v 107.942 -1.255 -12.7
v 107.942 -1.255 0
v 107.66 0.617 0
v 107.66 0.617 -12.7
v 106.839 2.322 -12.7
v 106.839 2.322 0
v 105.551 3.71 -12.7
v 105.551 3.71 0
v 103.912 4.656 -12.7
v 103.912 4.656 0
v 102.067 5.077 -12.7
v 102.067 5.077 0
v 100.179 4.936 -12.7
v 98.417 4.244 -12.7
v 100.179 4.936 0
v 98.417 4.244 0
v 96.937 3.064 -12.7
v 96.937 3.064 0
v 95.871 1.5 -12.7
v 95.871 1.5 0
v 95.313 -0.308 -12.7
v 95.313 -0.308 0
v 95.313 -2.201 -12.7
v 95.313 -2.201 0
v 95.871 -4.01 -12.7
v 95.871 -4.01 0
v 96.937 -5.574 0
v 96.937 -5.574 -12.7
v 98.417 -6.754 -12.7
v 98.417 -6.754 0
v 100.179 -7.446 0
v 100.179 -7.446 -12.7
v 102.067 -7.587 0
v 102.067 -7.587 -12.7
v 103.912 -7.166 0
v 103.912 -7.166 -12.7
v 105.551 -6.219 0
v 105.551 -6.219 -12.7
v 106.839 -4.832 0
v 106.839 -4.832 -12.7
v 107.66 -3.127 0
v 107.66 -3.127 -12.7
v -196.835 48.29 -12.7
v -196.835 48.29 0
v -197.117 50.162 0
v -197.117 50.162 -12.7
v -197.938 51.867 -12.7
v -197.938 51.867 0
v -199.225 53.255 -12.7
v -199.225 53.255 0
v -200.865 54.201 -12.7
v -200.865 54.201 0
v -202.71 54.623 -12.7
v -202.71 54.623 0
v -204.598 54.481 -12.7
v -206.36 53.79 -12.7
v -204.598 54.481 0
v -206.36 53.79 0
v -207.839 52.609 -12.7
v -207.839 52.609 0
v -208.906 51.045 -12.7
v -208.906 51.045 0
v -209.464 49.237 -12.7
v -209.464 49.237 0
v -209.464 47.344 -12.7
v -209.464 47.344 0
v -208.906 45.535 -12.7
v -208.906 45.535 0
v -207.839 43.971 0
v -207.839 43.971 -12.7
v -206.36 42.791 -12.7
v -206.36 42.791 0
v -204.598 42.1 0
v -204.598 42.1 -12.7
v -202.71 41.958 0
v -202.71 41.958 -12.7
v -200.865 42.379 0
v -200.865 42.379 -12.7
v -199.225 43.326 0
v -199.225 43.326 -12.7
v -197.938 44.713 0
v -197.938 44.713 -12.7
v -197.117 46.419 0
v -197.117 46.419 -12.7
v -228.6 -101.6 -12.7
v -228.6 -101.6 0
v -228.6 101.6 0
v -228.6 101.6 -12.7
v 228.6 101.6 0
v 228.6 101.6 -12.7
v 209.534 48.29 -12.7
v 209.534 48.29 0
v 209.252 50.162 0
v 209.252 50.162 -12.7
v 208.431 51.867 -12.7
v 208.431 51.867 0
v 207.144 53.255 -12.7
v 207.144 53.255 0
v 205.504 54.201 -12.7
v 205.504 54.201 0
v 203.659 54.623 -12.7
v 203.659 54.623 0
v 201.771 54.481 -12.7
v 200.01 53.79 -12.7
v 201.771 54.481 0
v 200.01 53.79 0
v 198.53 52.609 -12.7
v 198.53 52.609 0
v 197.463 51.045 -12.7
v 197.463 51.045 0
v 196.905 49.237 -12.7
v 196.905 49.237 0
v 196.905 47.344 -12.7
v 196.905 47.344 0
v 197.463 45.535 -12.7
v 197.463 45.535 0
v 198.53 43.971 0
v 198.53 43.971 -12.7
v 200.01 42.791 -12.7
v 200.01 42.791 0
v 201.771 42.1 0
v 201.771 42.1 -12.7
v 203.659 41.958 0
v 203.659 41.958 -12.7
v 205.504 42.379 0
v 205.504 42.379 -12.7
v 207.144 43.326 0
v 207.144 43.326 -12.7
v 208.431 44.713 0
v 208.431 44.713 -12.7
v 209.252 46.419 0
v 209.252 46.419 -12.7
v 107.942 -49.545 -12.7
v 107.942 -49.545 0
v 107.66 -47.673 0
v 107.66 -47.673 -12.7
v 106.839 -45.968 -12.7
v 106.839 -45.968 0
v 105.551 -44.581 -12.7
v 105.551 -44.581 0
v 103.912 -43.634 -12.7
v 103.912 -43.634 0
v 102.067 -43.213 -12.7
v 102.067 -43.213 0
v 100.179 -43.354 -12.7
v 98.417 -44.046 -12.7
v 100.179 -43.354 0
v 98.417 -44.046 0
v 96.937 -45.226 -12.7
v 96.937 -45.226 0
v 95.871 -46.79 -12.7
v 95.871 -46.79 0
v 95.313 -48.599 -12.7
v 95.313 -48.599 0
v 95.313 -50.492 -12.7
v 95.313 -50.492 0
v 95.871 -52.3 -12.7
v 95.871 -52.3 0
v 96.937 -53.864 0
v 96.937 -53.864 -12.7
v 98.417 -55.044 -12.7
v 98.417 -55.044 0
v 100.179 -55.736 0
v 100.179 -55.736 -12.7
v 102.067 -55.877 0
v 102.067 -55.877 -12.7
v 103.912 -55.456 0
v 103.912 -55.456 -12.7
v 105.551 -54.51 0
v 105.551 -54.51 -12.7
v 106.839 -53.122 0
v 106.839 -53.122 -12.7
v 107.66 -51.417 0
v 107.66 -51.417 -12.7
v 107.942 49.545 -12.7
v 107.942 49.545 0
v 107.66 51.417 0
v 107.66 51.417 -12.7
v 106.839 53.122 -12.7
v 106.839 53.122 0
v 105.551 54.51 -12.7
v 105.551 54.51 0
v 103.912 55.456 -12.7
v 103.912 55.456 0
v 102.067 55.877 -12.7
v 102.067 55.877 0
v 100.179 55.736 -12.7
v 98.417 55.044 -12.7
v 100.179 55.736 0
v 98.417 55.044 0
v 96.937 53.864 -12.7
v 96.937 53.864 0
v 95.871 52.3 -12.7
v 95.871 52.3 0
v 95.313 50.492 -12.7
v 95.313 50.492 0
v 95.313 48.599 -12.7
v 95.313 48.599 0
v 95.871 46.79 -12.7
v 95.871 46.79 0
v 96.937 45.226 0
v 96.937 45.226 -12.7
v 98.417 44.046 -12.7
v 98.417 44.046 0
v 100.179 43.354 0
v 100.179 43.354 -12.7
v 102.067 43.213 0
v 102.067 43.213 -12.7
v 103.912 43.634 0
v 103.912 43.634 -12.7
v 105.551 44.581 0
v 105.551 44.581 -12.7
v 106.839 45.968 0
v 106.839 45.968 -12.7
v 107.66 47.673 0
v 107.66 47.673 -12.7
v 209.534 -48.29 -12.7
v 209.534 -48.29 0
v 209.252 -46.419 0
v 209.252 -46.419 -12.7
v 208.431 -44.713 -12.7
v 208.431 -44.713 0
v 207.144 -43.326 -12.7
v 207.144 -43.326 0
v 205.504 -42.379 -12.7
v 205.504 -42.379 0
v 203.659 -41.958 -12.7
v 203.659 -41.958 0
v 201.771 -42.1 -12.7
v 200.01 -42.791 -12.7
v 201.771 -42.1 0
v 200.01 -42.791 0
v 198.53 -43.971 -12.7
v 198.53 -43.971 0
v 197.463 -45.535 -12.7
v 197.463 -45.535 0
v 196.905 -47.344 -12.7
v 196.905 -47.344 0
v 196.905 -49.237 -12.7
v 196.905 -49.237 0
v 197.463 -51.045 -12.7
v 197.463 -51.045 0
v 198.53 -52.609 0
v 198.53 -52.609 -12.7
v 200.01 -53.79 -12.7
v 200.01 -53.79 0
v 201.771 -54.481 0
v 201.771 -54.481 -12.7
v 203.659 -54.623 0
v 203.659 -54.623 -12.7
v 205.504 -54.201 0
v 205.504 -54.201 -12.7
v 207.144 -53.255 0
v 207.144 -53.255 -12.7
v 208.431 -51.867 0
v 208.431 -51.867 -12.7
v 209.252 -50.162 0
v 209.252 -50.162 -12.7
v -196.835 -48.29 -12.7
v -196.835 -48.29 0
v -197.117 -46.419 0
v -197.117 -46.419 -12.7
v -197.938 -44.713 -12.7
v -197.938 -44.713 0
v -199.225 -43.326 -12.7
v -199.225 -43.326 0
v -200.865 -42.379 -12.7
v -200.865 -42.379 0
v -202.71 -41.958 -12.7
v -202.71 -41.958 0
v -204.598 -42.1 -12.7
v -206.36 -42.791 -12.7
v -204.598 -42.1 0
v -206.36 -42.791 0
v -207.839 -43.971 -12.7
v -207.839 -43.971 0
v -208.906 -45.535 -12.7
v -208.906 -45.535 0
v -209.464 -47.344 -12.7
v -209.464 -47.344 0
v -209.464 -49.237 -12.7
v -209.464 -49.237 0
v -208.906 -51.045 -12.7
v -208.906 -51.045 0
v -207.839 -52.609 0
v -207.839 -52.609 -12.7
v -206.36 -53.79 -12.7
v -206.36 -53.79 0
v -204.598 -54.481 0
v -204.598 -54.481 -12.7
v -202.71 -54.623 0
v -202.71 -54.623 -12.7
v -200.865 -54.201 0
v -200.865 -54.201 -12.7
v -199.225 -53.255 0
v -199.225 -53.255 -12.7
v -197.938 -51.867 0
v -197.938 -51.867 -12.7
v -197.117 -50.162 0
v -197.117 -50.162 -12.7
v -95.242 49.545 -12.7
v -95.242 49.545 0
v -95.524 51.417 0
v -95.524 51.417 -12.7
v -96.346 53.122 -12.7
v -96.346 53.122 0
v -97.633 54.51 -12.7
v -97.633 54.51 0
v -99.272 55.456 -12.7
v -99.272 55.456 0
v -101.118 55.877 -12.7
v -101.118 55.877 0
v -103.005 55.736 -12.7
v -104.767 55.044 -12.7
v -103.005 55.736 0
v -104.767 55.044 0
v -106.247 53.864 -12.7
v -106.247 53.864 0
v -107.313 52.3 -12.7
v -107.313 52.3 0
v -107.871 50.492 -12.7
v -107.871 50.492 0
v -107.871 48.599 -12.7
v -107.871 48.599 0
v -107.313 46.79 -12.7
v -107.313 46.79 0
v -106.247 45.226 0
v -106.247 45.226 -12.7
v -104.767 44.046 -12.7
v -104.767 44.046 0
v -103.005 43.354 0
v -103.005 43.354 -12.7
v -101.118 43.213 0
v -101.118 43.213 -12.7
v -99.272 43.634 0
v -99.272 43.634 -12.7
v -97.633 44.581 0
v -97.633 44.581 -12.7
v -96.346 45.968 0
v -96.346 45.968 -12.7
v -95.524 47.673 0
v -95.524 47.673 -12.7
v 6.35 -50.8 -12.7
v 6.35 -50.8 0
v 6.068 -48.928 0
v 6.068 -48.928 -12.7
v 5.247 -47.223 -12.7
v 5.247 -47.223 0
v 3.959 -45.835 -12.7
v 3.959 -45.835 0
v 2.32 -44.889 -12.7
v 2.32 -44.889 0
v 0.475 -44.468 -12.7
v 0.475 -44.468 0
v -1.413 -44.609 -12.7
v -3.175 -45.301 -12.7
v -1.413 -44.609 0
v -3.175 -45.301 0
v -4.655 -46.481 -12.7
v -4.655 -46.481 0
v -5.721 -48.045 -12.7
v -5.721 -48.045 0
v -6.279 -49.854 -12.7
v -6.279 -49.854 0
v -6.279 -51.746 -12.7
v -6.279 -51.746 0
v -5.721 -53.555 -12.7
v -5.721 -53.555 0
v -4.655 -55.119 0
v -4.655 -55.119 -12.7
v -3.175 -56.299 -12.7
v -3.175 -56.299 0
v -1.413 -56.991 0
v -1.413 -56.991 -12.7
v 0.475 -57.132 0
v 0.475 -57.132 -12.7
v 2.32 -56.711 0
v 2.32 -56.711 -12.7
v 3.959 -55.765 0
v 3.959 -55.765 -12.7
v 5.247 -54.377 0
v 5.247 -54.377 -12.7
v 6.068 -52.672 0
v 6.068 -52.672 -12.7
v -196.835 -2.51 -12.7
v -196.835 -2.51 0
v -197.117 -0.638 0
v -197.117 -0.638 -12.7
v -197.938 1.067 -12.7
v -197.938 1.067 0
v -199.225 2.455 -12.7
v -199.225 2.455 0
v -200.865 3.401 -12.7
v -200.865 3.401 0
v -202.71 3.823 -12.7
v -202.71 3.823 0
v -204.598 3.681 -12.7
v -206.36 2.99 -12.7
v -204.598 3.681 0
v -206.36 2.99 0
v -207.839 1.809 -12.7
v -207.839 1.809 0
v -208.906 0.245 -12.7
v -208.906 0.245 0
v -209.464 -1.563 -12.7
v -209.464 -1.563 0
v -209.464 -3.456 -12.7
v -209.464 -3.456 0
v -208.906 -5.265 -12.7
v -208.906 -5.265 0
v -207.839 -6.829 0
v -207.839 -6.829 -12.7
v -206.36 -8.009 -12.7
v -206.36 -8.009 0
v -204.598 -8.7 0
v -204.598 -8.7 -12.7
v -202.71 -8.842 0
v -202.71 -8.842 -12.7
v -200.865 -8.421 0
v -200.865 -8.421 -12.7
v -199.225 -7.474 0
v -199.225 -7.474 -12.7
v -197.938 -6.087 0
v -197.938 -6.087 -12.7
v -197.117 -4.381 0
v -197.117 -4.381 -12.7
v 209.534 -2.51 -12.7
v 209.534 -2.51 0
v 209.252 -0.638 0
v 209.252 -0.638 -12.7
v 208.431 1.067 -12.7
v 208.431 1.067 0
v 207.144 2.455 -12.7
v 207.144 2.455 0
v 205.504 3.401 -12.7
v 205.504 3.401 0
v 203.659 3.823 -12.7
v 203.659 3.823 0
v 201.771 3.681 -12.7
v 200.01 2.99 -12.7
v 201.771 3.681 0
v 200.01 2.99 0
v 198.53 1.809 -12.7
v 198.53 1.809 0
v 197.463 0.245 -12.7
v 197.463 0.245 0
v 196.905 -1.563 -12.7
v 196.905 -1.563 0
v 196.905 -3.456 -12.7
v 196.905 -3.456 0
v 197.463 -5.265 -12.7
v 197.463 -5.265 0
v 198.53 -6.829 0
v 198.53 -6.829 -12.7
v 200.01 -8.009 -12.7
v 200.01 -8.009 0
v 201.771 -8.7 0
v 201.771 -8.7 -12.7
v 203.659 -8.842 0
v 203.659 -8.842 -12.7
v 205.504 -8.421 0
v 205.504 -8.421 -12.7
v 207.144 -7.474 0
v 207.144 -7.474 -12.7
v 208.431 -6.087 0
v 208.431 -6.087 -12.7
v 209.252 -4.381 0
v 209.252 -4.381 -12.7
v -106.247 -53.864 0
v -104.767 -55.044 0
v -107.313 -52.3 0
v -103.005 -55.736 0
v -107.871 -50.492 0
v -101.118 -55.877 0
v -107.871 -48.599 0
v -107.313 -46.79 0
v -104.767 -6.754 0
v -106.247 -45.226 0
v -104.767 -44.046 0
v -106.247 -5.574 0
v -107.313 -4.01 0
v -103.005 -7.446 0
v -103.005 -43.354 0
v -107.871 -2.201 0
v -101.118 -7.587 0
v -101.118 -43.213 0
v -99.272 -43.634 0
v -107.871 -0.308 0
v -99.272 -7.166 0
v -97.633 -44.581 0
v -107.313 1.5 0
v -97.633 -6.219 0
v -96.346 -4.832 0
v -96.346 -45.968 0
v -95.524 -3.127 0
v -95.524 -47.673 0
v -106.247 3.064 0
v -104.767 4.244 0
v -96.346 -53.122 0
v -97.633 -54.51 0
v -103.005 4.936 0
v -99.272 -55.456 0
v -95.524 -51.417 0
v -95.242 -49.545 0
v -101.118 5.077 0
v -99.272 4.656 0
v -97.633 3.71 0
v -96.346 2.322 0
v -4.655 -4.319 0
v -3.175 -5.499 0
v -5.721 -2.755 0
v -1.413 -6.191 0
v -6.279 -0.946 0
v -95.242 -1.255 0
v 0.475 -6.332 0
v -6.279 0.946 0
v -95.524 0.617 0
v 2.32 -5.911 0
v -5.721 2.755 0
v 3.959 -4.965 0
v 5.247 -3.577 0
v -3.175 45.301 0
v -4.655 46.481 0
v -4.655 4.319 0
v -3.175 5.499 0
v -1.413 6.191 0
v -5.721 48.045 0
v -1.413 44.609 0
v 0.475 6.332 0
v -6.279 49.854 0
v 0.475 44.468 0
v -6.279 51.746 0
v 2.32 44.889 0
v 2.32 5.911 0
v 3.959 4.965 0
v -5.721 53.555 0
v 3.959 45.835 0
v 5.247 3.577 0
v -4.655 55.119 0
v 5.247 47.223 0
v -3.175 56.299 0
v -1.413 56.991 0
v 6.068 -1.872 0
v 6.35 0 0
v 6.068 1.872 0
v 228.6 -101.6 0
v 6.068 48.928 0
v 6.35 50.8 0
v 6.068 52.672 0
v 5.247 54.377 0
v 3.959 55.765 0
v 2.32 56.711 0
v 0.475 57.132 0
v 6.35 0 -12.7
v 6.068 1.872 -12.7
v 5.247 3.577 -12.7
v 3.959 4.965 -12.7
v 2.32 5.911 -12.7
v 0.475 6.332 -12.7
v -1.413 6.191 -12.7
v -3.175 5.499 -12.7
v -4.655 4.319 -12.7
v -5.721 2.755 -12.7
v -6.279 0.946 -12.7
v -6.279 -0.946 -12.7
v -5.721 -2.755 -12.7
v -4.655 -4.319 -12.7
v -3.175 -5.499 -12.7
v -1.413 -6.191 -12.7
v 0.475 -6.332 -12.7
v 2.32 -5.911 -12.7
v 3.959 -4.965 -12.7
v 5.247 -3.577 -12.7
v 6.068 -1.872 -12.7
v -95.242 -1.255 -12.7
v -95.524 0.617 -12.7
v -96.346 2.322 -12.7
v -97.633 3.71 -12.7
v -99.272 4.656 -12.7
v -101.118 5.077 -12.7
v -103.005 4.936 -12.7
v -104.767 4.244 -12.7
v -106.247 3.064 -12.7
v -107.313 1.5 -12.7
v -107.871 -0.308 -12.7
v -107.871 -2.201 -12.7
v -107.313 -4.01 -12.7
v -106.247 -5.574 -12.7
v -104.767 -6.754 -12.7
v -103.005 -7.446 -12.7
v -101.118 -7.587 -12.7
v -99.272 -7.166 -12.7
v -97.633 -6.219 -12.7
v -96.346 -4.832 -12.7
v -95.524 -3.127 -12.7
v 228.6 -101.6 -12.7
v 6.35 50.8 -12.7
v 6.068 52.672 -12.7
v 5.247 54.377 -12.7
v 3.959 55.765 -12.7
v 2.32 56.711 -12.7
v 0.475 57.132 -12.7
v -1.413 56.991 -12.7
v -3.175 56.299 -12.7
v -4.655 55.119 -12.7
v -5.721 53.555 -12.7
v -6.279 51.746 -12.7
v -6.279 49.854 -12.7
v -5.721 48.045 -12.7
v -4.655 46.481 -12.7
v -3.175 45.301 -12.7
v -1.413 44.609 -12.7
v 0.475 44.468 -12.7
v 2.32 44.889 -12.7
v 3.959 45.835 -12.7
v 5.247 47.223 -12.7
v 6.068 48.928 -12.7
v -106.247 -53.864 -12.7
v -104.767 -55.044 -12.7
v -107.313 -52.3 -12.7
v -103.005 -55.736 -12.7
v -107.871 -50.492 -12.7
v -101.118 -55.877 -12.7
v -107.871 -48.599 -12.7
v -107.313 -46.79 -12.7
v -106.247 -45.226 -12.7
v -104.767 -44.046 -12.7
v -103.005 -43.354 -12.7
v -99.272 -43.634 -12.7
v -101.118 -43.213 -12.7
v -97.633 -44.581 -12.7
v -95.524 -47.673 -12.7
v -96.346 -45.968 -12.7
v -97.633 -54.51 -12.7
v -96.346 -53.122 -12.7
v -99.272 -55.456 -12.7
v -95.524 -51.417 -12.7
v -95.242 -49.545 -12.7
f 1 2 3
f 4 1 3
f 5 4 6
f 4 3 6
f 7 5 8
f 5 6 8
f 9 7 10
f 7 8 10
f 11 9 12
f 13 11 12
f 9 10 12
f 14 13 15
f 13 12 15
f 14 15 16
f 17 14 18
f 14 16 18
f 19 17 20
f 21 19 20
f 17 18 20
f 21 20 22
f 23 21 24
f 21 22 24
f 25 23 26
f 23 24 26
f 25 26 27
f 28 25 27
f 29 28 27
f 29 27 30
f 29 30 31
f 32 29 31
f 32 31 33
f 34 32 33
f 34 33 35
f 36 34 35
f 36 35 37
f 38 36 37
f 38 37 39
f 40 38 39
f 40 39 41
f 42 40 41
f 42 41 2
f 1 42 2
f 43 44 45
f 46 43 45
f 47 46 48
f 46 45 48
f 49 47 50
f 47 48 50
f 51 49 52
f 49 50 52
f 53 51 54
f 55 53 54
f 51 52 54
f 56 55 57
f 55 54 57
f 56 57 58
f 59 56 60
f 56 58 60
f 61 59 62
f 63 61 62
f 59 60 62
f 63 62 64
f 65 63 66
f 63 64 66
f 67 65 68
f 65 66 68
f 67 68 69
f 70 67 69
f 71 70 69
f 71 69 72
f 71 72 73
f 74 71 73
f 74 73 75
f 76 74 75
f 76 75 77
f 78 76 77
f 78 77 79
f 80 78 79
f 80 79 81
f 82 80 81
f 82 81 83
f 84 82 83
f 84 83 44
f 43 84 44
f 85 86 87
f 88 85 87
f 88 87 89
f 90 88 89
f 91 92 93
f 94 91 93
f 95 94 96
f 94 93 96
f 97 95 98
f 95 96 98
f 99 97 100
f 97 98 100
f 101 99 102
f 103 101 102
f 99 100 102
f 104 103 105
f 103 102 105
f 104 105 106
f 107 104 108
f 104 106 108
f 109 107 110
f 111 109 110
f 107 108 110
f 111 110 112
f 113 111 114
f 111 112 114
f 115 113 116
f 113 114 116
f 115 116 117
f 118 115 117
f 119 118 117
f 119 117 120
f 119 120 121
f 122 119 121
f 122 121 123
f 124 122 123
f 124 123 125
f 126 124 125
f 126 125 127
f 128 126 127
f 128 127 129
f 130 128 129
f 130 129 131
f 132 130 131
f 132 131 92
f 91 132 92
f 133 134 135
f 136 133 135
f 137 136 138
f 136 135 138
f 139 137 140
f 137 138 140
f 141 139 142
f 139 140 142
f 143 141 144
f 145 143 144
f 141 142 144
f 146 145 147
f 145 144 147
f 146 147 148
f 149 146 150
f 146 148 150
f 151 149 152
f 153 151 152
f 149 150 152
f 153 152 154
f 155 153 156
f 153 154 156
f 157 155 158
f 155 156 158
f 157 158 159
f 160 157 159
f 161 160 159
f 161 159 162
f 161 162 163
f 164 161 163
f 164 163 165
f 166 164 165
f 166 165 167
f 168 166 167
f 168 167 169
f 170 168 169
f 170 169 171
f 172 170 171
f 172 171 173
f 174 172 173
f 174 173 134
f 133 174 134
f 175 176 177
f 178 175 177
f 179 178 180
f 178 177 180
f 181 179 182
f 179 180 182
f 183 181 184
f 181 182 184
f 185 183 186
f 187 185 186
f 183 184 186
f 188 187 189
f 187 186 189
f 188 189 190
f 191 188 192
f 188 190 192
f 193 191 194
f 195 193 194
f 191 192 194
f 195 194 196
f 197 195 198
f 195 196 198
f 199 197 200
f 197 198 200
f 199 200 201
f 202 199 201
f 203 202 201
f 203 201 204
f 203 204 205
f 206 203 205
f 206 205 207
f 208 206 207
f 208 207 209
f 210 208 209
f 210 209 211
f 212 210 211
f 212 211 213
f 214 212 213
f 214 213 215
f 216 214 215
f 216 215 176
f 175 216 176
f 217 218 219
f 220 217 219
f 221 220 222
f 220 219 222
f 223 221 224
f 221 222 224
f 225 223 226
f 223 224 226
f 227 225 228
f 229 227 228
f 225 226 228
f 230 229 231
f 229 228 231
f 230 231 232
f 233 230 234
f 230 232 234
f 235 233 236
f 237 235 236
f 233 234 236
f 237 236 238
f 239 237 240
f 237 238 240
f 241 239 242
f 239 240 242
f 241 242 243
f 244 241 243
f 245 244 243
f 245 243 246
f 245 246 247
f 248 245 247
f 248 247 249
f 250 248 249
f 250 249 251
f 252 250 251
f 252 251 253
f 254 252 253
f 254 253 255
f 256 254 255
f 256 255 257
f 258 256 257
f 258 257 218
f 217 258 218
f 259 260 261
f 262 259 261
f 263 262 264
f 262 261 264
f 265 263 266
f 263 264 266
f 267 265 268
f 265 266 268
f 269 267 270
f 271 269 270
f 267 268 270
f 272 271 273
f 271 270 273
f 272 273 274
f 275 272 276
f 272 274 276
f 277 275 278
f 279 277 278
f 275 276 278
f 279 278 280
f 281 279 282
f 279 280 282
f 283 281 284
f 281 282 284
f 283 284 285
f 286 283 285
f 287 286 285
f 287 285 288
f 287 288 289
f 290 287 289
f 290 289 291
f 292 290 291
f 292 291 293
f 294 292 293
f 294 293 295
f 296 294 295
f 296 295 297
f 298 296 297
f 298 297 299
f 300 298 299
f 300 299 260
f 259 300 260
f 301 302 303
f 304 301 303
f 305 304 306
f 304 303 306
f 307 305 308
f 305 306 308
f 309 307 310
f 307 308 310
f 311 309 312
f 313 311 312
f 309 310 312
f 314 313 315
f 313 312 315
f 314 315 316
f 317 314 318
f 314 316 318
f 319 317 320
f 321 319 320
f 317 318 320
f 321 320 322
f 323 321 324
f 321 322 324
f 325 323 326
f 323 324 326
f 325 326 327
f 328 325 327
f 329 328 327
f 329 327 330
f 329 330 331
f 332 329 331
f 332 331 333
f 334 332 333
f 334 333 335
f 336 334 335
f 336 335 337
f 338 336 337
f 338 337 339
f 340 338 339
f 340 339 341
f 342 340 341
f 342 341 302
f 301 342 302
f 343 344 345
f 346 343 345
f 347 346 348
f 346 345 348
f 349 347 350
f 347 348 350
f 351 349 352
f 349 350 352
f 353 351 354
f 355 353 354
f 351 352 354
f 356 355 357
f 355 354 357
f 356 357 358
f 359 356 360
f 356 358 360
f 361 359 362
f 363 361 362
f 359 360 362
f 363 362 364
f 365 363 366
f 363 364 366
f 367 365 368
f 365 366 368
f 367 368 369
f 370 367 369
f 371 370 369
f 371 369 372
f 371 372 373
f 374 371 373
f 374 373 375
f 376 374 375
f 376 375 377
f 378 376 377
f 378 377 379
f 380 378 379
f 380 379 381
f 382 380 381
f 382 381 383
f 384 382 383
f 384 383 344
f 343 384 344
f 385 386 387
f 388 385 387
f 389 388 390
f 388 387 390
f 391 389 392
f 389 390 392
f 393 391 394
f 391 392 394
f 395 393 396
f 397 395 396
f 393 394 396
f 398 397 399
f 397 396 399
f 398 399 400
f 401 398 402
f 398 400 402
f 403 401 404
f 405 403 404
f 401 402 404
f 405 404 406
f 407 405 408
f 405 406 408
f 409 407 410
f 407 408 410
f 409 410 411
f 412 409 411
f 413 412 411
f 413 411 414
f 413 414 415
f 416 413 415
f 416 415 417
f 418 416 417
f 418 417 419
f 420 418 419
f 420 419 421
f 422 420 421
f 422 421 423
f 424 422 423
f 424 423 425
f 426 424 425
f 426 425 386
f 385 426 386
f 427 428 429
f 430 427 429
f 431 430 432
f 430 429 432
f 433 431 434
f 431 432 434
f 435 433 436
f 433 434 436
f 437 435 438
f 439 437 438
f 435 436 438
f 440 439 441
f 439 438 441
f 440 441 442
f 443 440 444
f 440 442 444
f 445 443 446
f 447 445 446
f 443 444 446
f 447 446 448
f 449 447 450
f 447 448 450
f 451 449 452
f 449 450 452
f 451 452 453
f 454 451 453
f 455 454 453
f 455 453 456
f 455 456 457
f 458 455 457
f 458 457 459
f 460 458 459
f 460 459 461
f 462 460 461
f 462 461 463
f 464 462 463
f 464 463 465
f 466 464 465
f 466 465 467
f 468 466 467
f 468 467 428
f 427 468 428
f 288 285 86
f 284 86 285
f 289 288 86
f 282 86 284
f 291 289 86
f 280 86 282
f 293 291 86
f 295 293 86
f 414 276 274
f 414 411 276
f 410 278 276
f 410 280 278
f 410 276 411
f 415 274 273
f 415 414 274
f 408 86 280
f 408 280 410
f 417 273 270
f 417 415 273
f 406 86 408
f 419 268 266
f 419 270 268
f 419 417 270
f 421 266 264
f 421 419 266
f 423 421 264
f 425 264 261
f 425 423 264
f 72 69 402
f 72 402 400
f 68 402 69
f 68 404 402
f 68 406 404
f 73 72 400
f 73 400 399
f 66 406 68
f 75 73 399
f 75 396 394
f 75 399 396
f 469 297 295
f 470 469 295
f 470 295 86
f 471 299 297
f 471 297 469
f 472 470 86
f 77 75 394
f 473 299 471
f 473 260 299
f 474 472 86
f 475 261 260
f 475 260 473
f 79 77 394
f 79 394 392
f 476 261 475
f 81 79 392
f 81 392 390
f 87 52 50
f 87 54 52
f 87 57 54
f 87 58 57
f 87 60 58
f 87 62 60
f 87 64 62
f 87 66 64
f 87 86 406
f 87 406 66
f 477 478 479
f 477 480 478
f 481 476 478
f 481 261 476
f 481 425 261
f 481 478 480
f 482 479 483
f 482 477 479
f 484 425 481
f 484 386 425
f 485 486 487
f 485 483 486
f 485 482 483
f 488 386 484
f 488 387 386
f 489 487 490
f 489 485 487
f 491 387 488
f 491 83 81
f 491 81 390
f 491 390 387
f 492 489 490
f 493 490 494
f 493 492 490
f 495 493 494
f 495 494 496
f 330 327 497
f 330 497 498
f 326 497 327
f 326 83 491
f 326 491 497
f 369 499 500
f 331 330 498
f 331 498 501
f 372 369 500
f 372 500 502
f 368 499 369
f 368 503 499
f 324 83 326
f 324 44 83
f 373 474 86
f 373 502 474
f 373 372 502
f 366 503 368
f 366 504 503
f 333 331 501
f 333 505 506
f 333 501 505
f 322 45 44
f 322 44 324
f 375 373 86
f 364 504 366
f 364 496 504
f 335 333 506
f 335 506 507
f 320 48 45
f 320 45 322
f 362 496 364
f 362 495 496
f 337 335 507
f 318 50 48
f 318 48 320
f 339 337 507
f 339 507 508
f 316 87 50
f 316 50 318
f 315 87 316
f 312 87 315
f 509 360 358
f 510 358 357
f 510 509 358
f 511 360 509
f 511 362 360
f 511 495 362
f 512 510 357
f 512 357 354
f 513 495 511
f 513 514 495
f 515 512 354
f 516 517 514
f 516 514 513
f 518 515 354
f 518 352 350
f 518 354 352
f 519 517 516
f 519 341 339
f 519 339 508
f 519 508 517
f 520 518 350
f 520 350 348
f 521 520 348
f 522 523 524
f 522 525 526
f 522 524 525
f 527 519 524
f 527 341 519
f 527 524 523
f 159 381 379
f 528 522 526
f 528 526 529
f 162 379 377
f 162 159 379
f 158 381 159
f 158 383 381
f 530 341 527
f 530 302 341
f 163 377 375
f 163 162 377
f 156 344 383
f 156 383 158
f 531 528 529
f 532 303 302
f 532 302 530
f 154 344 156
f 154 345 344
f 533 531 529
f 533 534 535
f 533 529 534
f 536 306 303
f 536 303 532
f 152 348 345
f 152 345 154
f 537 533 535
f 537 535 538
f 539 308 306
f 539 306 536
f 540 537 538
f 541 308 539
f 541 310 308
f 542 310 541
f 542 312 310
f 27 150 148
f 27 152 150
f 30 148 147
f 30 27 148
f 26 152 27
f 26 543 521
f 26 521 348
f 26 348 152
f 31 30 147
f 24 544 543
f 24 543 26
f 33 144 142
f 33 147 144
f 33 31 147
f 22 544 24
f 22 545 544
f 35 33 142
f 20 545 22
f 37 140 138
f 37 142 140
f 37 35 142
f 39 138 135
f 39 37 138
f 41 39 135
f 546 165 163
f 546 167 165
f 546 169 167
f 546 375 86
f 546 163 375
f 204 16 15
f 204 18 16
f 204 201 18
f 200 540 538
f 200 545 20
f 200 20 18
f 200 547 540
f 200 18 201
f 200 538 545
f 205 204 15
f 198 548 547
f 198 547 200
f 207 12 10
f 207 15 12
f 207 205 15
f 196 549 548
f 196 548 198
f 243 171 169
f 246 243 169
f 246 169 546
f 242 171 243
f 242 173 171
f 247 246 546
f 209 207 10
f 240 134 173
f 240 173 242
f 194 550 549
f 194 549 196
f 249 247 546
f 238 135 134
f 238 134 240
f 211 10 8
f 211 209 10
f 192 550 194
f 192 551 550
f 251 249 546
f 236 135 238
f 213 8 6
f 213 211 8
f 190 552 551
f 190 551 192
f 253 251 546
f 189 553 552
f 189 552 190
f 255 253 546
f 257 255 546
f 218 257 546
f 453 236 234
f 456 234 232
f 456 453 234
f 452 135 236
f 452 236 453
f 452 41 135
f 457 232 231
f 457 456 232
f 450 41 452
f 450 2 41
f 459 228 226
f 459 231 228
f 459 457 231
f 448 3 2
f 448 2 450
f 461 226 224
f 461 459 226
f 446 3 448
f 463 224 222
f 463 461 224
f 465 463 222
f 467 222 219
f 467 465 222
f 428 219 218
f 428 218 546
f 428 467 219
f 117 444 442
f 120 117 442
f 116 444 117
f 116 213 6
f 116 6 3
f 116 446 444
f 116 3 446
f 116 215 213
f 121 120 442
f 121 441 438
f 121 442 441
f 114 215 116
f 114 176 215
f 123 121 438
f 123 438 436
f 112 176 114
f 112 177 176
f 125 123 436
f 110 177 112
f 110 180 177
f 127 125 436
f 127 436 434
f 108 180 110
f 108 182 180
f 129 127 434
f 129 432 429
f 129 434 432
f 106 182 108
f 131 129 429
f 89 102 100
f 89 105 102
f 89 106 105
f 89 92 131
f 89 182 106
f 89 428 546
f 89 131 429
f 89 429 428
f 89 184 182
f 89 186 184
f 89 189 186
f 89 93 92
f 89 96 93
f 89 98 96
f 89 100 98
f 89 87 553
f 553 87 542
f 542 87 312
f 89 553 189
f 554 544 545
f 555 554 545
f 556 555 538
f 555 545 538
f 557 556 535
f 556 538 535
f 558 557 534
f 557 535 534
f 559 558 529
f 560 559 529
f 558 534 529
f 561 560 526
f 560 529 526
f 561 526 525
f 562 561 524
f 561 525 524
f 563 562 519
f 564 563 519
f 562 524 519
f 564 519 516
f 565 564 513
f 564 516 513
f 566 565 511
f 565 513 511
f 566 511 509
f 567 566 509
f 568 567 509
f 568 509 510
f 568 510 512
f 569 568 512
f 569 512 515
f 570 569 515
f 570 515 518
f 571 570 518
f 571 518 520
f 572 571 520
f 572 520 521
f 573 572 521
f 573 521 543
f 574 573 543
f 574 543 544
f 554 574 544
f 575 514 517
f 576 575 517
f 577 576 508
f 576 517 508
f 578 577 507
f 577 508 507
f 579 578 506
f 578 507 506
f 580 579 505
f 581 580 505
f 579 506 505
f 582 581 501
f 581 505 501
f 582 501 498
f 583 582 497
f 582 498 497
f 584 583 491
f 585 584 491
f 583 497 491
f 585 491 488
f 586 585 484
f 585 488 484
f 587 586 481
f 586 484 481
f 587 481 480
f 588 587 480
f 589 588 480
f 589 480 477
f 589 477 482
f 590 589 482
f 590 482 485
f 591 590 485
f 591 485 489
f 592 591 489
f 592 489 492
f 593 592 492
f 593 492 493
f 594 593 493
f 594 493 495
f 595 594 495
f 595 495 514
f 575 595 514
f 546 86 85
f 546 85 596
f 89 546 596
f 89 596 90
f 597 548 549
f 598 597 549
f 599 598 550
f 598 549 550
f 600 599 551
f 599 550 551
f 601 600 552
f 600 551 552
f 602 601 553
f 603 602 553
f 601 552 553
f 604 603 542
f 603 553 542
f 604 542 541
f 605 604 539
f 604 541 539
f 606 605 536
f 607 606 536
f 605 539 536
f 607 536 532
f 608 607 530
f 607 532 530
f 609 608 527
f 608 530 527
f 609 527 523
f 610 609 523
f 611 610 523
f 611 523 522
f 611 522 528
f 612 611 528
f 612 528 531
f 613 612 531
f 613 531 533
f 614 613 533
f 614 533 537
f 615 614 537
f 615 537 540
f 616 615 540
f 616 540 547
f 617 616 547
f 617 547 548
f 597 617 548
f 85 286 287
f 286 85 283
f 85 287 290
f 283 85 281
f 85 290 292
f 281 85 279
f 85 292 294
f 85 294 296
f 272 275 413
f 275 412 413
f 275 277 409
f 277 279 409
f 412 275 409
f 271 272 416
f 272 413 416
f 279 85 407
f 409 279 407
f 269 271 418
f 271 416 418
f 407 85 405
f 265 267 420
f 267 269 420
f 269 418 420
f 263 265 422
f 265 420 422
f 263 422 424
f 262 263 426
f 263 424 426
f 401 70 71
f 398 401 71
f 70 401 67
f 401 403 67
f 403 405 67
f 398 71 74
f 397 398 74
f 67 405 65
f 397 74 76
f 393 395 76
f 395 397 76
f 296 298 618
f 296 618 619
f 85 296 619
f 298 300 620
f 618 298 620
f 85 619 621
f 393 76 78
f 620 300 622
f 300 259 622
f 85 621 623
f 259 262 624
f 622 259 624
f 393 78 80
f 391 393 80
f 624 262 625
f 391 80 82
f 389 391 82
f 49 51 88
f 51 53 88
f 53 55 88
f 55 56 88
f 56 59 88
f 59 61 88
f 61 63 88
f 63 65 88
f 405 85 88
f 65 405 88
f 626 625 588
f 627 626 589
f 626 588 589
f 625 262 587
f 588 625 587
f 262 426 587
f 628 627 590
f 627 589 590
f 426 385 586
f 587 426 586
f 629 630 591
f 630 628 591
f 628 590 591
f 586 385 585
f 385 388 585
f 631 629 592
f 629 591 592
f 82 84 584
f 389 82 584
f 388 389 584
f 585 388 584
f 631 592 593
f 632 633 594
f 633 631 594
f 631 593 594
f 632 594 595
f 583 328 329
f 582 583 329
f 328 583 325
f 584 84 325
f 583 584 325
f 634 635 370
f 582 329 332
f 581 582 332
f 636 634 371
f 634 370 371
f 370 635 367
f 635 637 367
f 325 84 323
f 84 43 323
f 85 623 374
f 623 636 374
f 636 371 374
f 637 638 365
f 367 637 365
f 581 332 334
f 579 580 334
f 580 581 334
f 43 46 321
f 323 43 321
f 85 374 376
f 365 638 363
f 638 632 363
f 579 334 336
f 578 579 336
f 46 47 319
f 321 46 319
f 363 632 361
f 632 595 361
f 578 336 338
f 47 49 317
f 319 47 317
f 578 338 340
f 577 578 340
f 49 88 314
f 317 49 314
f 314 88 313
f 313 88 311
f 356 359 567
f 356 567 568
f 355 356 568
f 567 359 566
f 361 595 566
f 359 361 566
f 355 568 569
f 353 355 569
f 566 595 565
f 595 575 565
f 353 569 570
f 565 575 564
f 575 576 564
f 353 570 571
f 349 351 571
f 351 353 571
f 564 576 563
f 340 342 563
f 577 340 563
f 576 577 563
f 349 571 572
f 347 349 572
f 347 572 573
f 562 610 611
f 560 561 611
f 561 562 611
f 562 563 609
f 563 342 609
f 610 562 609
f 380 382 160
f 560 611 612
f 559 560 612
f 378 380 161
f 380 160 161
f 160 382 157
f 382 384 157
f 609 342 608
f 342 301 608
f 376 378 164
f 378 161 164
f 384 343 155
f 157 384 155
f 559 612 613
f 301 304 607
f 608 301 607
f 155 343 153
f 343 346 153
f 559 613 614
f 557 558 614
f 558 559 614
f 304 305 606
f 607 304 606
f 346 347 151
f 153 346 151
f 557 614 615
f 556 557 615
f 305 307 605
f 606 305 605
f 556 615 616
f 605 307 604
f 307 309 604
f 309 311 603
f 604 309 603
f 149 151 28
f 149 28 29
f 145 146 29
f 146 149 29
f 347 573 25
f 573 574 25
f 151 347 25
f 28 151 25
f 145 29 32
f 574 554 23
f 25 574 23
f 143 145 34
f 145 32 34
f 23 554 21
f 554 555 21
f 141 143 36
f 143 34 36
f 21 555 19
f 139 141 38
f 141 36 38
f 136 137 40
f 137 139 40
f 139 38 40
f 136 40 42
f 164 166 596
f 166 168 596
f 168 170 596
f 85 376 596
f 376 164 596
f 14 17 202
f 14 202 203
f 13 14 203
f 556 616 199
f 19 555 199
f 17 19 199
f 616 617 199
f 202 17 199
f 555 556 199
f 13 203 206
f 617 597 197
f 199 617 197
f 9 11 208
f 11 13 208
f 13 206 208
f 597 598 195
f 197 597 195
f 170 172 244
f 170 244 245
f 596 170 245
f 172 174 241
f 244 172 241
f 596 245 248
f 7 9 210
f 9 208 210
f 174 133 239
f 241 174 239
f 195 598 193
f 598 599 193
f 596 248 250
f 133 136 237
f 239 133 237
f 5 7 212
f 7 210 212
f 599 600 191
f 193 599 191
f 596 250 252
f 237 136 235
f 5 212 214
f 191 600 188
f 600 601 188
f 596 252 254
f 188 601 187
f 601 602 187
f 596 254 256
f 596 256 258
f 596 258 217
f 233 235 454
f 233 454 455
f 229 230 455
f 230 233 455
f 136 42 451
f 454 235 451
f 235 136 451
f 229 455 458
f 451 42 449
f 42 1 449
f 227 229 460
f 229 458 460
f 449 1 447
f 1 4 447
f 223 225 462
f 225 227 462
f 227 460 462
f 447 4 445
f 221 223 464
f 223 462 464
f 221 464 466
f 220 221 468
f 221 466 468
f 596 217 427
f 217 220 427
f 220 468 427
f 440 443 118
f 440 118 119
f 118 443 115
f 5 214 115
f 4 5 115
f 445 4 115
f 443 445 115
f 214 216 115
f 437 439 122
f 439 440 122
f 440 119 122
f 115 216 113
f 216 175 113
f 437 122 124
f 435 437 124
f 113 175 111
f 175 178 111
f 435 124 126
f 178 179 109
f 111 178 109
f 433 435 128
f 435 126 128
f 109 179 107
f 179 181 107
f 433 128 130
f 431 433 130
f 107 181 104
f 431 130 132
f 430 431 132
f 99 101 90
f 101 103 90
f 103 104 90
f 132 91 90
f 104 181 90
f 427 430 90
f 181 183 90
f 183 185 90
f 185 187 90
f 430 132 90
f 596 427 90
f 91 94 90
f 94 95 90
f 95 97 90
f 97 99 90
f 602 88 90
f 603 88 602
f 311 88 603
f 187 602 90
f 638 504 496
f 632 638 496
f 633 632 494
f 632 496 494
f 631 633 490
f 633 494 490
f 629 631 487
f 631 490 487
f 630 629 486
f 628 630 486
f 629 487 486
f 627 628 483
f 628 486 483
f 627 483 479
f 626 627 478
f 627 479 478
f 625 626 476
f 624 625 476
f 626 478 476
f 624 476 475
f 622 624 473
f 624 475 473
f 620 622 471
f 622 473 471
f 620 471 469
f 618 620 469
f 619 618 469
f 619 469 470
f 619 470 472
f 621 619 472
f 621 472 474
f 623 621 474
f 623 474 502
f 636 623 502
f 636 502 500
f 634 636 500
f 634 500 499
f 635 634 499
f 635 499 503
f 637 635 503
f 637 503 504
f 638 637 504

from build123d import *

# Parameters (mm, degrees)
F0_W     = 457.2
F0_H     = 203.2
F1_DEPTH = 12.7
F2_R     = 6.35
F3_DEPTH = 25.4


with BuildPart() as f1:
    # F0 (on Top) → F1 (new body)
    with BuildSketch(Plane.XY):
        Rectangle(F0_W, F0_H)
    extrude(amount=-F1_DEPTH)

    # F2 (on face) → F3 (cut)
    with BuildSketch(Plane.XY):
        Circle(F2_R)
        with Locations((0, 50.8)):
            Circle(F2_R)
        with Locations((101.59225, -1.254837)):
            Circle(F2_R)
        with Locations((101.59225, 49.545163)):
            Circle(F2_R)
        with Locations((203.1845, -2.509675)):
            Circle(F2_R)
        with Locations((203.1845, 48.290325)):
            Circle(F2_R)
        with Locations((101.59225, -49.545163)):
            Circle(F2_R)
        with Locations((203.1845, -48.290325)):
            Circle(F2_R)
        with Locations((0, -50.8)):
            Circle(F2_R)
        with Locations((-101.59225, -1.254837)):
            Circle(F2_R)
        with Locations((-101.59225, -49.545163)):
            Circle(F2_R)
        with Locations((-203.1845, -48.290325)):
            Circle(F2_R)
        with Locations((-101.59225, 49.545163)):
            Circle(F2_R)
        with Locations((-203.1845, -2.509675)):
            Circle(F2_R)
        with Locations((-203.1845, 48.290325)):
            Circle(F2_R)
    extrude(amount=-F3_DEPTH, mode=Mode.SUBTRACT)


solid = f1.part
